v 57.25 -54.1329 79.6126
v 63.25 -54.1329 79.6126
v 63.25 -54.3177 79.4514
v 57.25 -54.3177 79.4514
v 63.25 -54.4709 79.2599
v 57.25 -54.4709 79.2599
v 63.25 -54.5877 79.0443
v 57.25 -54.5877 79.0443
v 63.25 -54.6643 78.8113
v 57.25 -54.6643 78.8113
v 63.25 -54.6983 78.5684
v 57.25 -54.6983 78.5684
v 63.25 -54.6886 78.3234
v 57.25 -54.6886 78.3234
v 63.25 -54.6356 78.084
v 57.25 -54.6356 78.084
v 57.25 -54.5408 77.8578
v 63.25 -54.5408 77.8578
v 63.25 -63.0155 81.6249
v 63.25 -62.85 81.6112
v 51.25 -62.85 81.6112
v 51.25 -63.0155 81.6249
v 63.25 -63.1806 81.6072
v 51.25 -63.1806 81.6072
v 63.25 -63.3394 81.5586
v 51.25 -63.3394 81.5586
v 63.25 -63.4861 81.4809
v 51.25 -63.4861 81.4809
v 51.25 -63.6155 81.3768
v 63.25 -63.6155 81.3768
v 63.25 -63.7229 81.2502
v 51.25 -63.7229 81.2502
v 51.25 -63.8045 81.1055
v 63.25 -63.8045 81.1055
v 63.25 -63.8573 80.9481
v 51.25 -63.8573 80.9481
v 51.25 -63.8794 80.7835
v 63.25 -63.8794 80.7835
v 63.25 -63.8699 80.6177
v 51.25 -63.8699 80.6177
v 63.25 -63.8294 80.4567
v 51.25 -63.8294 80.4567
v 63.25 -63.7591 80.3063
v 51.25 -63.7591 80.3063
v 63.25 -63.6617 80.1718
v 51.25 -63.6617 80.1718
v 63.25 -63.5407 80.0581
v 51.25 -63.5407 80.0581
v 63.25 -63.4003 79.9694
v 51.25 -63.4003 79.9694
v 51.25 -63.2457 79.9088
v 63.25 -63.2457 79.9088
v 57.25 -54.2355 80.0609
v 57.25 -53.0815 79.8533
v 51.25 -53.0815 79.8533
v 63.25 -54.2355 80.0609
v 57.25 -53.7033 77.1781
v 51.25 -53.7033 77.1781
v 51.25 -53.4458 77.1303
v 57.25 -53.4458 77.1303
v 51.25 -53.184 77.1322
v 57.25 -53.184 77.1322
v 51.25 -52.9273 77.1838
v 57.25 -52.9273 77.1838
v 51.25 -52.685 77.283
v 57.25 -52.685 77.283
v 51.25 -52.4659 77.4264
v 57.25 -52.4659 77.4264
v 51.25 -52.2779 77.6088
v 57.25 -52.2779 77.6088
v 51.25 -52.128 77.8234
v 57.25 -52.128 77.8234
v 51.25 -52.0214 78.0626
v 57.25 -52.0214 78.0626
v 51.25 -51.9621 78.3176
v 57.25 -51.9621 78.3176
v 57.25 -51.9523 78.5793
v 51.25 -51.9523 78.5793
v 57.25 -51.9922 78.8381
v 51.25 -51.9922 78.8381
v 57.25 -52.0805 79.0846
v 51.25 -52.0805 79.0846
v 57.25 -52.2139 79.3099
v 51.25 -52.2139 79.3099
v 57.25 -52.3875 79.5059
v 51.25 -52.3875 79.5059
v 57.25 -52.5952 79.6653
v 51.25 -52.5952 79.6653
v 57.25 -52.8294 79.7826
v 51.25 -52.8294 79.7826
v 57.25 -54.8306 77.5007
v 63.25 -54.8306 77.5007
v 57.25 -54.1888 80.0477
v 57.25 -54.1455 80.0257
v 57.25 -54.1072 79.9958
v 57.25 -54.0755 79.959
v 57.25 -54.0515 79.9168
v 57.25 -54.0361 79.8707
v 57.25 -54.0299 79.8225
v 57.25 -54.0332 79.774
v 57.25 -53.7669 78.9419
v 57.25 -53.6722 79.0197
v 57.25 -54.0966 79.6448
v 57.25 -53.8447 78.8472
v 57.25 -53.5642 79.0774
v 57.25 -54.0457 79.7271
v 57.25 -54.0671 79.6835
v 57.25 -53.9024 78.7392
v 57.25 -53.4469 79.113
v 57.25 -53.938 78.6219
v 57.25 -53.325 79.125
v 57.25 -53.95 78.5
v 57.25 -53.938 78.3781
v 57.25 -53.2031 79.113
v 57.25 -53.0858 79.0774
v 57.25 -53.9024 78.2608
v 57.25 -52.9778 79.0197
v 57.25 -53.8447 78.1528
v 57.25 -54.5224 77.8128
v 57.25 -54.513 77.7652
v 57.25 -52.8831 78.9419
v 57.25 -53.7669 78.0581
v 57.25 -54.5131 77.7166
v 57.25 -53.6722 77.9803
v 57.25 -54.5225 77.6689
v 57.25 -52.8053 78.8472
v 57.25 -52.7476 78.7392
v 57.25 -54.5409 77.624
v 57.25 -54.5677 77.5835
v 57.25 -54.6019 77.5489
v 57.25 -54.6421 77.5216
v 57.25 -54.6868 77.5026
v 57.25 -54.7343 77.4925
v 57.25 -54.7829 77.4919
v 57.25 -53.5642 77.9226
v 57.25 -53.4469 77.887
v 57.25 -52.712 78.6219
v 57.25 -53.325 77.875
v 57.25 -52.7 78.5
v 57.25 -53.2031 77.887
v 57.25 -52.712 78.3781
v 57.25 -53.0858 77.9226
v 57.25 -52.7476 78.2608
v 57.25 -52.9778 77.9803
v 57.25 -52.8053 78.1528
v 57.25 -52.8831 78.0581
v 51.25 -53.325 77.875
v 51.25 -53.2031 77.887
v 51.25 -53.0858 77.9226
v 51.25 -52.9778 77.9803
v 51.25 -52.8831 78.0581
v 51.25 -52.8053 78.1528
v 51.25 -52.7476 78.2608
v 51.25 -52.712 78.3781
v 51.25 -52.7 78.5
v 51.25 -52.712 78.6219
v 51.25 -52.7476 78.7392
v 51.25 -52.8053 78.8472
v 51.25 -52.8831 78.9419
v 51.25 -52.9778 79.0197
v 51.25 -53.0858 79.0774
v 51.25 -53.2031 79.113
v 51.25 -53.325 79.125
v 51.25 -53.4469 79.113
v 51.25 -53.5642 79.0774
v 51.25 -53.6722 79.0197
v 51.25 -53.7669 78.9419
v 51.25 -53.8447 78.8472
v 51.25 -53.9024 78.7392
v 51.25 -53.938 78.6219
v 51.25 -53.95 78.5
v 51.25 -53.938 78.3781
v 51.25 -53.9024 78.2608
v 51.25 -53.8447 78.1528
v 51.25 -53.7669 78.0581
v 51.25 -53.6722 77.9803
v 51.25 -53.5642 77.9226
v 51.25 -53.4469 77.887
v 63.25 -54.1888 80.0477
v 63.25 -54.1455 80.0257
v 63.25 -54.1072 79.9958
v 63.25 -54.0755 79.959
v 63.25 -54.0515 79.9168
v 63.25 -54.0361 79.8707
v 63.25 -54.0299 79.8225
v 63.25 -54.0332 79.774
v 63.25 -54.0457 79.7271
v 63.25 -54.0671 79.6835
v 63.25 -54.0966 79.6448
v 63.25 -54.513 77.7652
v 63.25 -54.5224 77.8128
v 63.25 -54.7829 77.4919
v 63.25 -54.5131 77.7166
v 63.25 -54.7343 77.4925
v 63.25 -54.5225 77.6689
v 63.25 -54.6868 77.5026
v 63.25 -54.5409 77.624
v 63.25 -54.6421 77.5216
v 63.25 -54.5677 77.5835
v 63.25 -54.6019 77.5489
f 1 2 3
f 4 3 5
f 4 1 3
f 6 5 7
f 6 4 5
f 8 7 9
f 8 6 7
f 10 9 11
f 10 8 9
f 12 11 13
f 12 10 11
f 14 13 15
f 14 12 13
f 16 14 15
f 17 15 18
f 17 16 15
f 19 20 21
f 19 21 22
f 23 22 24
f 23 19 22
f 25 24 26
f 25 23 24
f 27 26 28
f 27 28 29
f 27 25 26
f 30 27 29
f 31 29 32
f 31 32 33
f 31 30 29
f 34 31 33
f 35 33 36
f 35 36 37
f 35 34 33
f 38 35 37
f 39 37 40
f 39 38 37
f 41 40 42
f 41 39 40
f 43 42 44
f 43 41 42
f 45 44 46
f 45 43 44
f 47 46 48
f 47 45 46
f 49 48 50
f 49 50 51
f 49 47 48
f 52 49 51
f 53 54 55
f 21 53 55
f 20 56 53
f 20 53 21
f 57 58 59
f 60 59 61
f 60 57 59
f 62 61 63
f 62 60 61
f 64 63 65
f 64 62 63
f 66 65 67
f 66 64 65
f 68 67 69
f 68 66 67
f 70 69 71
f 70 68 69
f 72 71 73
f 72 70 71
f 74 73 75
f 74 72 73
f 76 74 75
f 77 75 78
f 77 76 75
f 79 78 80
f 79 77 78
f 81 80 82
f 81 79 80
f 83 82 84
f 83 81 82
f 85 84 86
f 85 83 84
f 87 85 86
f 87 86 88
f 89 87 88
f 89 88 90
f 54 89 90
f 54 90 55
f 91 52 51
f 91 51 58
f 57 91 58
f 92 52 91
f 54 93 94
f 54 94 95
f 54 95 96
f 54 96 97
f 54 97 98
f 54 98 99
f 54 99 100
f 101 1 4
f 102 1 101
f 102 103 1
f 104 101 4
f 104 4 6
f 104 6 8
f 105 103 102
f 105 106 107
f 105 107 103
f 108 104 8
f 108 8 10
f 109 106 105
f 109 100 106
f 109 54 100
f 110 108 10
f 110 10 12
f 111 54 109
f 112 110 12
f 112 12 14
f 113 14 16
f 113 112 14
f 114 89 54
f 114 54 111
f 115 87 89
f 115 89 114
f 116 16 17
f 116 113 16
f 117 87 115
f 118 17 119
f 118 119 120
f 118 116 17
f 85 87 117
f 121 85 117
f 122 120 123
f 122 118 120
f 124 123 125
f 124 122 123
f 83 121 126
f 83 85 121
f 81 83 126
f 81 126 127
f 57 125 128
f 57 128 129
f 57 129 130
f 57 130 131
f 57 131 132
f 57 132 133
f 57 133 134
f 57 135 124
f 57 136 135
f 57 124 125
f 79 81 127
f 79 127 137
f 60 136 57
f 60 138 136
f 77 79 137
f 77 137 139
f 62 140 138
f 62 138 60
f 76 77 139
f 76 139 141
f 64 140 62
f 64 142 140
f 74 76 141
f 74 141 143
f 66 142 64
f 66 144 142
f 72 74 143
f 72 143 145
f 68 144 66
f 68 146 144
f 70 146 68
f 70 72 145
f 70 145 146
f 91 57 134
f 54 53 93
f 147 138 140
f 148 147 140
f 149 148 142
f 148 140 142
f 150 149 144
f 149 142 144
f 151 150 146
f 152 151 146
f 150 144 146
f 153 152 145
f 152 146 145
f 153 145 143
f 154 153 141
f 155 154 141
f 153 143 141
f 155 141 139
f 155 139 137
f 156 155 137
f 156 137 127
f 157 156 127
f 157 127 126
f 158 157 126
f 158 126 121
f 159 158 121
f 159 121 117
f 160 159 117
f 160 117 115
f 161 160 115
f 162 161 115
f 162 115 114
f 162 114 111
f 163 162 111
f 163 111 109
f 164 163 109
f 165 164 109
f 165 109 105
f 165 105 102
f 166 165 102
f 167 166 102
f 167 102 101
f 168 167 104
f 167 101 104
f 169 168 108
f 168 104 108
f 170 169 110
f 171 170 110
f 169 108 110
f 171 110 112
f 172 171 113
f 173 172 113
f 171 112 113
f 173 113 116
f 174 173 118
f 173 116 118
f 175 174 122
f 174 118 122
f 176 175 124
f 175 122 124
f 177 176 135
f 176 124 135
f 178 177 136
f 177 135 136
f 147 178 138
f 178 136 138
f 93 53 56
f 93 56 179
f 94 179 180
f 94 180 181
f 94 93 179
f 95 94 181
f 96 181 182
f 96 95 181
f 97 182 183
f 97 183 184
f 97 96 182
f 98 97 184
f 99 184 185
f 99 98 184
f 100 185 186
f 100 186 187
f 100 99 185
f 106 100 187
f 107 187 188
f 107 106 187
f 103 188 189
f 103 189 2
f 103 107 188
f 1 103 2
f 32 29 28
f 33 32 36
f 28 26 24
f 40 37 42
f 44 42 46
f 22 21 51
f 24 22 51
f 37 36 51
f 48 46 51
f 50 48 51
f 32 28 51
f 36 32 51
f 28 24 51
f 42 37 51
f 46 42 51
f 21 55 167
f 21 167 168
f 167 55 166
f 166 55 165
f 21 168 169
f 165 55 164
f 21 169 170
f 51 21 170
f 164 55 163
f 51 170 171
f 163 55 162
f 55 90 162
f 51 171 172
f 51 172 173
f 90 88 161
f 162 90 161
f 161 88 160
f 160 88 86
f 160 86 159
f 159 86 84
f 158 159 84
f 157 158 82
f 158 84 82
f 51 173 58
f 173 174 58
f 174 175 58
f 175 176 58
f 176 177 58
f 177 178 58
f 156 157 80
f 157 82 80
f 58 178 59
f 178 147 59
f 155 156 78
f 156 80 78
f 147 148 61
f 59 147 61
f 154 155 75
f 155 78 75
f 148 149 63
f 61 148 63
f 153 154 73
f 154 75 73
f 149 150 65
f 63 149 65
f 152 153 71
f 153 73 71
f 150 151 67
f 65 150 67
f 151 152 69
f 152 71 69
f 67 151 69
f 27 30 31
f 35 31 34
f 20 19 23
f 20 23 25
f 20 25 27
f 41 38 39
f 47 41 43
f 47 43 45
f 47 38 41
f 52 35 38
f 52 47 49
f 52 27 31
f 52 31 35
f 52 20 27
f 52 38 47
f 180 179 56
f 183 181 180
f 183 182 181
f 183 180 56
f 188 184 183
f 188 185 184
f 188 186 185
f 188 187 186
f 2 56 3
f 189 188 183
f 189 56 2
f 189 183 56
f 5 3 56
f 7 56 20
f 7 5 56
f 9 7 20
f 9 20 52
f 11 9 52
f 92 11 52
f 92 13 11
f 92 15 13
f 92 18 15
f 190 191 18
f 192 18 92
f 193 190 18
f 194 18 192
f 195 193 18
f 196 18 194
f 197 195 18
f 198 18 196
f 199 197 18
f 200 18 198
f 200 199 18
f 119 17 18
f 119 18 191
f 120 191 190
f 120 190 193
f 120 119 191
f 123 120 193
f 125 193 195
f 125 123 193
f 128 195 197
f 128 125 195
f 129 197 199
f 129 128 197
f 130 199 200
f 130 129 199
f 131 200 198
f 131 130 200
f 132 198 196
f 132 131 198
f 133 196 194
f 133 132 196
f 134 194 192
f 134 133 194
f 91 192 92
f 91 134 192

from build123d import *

# Parameters (mm, degrees)
SKETCH_1_R          = 0.625
EXTRUDE_1_DEPTH     = 12
CUT_EXTRUDE_START   = -6
SKETCH_2_R          = 1.375
CUT_EXTRUDE_1_DEPTH = 6
CUT_EXTRUDE_2_DEPTH = 6


with BuildPart() as part:
    # 草图1 → 凸台-拉伸1 (new body)
    with BuildSketch(Plane(origin=(63.25, 0, 0), x_dir=(0, 0, -1), z_dir=(1, 0, 0))):
        with BuildLine():
            Line((-79.908766601, -63.245730904), (-77.178061801, -53.70329142))
            ThreePointArc((-77.178061801, -53.70329142), (-78.188696573, -51.985703477), (-79.853262586, -53.081473056))
            Line((-79.853262586, -53.081473056), (-81.6111671, -62.850028308))
            ThreePointArc((-81.6111671, -62.850028308), (-80.948102181, -63.857279605), (-79.908766601, -63.245730904))
        make_face()
        with Locations((-78.5, -53.325)):
            Circle(SKETCH_1_R, mode=Mode.SUBTRACT)
    extrude(amount=-EXTRUDE_1_DEPTH)

    # 草图2 → 切除-拉伸1 (cut)
    with BuildSketch(Plane(origin=(63.25, 0, 0), x_dir=(0, 0, -1), z_dir=(1, 0, 0)).offset(CUT_EXTRUDE_START)):
        with Locations((-78.5, -53.325)):
            Circle(SKETCH_2_R)
    extrude(amount=CUT_EXTRUDE_1_DEPTH, mode=Mode.SUBTRACT)

    # 草图3 → 切除-拉伸2 (cut)
    with BuildSketch(Plane(origin=(63.25, 0, 0), x_dir=(0, 0, -1), z_dir=(1, 0, 0)).offset(CUT_EXTRUDE_START)):
        with BuildLine():
            Line((-79.853262586, -53.081473056), (-80.060943062, -54.235539267))
            ThreePointArc((-80.060943062, -54.235539267), (-79.870673692, -54.036118774), (-79.612603732, -54.132921987))
            ThreePointArc((-79.612603732, -54.132921987), (-79.840339654, -53.631781049), (-79.853262586, -53.081473056))
        make_face()
        with BuildLine():
            ThreePointArc((-77.178061801, -53.70329142), (-77.432371823, -54.191484319), (-77.857788029, -54.540807873))
            ThreePointArc((-77.857788029, -54.540807873), (-77.583479618, -54.567749621), (-77.500669801, -54.83064408))
            Line((-77.500669801, -54.83064408), (-77.178061801, -53.70329142))
        make_face()
    extrude(amount=CUT_EXTRUDE_2_DEPTH, mode=Mode.SUBTRACT)


solid = part.part
